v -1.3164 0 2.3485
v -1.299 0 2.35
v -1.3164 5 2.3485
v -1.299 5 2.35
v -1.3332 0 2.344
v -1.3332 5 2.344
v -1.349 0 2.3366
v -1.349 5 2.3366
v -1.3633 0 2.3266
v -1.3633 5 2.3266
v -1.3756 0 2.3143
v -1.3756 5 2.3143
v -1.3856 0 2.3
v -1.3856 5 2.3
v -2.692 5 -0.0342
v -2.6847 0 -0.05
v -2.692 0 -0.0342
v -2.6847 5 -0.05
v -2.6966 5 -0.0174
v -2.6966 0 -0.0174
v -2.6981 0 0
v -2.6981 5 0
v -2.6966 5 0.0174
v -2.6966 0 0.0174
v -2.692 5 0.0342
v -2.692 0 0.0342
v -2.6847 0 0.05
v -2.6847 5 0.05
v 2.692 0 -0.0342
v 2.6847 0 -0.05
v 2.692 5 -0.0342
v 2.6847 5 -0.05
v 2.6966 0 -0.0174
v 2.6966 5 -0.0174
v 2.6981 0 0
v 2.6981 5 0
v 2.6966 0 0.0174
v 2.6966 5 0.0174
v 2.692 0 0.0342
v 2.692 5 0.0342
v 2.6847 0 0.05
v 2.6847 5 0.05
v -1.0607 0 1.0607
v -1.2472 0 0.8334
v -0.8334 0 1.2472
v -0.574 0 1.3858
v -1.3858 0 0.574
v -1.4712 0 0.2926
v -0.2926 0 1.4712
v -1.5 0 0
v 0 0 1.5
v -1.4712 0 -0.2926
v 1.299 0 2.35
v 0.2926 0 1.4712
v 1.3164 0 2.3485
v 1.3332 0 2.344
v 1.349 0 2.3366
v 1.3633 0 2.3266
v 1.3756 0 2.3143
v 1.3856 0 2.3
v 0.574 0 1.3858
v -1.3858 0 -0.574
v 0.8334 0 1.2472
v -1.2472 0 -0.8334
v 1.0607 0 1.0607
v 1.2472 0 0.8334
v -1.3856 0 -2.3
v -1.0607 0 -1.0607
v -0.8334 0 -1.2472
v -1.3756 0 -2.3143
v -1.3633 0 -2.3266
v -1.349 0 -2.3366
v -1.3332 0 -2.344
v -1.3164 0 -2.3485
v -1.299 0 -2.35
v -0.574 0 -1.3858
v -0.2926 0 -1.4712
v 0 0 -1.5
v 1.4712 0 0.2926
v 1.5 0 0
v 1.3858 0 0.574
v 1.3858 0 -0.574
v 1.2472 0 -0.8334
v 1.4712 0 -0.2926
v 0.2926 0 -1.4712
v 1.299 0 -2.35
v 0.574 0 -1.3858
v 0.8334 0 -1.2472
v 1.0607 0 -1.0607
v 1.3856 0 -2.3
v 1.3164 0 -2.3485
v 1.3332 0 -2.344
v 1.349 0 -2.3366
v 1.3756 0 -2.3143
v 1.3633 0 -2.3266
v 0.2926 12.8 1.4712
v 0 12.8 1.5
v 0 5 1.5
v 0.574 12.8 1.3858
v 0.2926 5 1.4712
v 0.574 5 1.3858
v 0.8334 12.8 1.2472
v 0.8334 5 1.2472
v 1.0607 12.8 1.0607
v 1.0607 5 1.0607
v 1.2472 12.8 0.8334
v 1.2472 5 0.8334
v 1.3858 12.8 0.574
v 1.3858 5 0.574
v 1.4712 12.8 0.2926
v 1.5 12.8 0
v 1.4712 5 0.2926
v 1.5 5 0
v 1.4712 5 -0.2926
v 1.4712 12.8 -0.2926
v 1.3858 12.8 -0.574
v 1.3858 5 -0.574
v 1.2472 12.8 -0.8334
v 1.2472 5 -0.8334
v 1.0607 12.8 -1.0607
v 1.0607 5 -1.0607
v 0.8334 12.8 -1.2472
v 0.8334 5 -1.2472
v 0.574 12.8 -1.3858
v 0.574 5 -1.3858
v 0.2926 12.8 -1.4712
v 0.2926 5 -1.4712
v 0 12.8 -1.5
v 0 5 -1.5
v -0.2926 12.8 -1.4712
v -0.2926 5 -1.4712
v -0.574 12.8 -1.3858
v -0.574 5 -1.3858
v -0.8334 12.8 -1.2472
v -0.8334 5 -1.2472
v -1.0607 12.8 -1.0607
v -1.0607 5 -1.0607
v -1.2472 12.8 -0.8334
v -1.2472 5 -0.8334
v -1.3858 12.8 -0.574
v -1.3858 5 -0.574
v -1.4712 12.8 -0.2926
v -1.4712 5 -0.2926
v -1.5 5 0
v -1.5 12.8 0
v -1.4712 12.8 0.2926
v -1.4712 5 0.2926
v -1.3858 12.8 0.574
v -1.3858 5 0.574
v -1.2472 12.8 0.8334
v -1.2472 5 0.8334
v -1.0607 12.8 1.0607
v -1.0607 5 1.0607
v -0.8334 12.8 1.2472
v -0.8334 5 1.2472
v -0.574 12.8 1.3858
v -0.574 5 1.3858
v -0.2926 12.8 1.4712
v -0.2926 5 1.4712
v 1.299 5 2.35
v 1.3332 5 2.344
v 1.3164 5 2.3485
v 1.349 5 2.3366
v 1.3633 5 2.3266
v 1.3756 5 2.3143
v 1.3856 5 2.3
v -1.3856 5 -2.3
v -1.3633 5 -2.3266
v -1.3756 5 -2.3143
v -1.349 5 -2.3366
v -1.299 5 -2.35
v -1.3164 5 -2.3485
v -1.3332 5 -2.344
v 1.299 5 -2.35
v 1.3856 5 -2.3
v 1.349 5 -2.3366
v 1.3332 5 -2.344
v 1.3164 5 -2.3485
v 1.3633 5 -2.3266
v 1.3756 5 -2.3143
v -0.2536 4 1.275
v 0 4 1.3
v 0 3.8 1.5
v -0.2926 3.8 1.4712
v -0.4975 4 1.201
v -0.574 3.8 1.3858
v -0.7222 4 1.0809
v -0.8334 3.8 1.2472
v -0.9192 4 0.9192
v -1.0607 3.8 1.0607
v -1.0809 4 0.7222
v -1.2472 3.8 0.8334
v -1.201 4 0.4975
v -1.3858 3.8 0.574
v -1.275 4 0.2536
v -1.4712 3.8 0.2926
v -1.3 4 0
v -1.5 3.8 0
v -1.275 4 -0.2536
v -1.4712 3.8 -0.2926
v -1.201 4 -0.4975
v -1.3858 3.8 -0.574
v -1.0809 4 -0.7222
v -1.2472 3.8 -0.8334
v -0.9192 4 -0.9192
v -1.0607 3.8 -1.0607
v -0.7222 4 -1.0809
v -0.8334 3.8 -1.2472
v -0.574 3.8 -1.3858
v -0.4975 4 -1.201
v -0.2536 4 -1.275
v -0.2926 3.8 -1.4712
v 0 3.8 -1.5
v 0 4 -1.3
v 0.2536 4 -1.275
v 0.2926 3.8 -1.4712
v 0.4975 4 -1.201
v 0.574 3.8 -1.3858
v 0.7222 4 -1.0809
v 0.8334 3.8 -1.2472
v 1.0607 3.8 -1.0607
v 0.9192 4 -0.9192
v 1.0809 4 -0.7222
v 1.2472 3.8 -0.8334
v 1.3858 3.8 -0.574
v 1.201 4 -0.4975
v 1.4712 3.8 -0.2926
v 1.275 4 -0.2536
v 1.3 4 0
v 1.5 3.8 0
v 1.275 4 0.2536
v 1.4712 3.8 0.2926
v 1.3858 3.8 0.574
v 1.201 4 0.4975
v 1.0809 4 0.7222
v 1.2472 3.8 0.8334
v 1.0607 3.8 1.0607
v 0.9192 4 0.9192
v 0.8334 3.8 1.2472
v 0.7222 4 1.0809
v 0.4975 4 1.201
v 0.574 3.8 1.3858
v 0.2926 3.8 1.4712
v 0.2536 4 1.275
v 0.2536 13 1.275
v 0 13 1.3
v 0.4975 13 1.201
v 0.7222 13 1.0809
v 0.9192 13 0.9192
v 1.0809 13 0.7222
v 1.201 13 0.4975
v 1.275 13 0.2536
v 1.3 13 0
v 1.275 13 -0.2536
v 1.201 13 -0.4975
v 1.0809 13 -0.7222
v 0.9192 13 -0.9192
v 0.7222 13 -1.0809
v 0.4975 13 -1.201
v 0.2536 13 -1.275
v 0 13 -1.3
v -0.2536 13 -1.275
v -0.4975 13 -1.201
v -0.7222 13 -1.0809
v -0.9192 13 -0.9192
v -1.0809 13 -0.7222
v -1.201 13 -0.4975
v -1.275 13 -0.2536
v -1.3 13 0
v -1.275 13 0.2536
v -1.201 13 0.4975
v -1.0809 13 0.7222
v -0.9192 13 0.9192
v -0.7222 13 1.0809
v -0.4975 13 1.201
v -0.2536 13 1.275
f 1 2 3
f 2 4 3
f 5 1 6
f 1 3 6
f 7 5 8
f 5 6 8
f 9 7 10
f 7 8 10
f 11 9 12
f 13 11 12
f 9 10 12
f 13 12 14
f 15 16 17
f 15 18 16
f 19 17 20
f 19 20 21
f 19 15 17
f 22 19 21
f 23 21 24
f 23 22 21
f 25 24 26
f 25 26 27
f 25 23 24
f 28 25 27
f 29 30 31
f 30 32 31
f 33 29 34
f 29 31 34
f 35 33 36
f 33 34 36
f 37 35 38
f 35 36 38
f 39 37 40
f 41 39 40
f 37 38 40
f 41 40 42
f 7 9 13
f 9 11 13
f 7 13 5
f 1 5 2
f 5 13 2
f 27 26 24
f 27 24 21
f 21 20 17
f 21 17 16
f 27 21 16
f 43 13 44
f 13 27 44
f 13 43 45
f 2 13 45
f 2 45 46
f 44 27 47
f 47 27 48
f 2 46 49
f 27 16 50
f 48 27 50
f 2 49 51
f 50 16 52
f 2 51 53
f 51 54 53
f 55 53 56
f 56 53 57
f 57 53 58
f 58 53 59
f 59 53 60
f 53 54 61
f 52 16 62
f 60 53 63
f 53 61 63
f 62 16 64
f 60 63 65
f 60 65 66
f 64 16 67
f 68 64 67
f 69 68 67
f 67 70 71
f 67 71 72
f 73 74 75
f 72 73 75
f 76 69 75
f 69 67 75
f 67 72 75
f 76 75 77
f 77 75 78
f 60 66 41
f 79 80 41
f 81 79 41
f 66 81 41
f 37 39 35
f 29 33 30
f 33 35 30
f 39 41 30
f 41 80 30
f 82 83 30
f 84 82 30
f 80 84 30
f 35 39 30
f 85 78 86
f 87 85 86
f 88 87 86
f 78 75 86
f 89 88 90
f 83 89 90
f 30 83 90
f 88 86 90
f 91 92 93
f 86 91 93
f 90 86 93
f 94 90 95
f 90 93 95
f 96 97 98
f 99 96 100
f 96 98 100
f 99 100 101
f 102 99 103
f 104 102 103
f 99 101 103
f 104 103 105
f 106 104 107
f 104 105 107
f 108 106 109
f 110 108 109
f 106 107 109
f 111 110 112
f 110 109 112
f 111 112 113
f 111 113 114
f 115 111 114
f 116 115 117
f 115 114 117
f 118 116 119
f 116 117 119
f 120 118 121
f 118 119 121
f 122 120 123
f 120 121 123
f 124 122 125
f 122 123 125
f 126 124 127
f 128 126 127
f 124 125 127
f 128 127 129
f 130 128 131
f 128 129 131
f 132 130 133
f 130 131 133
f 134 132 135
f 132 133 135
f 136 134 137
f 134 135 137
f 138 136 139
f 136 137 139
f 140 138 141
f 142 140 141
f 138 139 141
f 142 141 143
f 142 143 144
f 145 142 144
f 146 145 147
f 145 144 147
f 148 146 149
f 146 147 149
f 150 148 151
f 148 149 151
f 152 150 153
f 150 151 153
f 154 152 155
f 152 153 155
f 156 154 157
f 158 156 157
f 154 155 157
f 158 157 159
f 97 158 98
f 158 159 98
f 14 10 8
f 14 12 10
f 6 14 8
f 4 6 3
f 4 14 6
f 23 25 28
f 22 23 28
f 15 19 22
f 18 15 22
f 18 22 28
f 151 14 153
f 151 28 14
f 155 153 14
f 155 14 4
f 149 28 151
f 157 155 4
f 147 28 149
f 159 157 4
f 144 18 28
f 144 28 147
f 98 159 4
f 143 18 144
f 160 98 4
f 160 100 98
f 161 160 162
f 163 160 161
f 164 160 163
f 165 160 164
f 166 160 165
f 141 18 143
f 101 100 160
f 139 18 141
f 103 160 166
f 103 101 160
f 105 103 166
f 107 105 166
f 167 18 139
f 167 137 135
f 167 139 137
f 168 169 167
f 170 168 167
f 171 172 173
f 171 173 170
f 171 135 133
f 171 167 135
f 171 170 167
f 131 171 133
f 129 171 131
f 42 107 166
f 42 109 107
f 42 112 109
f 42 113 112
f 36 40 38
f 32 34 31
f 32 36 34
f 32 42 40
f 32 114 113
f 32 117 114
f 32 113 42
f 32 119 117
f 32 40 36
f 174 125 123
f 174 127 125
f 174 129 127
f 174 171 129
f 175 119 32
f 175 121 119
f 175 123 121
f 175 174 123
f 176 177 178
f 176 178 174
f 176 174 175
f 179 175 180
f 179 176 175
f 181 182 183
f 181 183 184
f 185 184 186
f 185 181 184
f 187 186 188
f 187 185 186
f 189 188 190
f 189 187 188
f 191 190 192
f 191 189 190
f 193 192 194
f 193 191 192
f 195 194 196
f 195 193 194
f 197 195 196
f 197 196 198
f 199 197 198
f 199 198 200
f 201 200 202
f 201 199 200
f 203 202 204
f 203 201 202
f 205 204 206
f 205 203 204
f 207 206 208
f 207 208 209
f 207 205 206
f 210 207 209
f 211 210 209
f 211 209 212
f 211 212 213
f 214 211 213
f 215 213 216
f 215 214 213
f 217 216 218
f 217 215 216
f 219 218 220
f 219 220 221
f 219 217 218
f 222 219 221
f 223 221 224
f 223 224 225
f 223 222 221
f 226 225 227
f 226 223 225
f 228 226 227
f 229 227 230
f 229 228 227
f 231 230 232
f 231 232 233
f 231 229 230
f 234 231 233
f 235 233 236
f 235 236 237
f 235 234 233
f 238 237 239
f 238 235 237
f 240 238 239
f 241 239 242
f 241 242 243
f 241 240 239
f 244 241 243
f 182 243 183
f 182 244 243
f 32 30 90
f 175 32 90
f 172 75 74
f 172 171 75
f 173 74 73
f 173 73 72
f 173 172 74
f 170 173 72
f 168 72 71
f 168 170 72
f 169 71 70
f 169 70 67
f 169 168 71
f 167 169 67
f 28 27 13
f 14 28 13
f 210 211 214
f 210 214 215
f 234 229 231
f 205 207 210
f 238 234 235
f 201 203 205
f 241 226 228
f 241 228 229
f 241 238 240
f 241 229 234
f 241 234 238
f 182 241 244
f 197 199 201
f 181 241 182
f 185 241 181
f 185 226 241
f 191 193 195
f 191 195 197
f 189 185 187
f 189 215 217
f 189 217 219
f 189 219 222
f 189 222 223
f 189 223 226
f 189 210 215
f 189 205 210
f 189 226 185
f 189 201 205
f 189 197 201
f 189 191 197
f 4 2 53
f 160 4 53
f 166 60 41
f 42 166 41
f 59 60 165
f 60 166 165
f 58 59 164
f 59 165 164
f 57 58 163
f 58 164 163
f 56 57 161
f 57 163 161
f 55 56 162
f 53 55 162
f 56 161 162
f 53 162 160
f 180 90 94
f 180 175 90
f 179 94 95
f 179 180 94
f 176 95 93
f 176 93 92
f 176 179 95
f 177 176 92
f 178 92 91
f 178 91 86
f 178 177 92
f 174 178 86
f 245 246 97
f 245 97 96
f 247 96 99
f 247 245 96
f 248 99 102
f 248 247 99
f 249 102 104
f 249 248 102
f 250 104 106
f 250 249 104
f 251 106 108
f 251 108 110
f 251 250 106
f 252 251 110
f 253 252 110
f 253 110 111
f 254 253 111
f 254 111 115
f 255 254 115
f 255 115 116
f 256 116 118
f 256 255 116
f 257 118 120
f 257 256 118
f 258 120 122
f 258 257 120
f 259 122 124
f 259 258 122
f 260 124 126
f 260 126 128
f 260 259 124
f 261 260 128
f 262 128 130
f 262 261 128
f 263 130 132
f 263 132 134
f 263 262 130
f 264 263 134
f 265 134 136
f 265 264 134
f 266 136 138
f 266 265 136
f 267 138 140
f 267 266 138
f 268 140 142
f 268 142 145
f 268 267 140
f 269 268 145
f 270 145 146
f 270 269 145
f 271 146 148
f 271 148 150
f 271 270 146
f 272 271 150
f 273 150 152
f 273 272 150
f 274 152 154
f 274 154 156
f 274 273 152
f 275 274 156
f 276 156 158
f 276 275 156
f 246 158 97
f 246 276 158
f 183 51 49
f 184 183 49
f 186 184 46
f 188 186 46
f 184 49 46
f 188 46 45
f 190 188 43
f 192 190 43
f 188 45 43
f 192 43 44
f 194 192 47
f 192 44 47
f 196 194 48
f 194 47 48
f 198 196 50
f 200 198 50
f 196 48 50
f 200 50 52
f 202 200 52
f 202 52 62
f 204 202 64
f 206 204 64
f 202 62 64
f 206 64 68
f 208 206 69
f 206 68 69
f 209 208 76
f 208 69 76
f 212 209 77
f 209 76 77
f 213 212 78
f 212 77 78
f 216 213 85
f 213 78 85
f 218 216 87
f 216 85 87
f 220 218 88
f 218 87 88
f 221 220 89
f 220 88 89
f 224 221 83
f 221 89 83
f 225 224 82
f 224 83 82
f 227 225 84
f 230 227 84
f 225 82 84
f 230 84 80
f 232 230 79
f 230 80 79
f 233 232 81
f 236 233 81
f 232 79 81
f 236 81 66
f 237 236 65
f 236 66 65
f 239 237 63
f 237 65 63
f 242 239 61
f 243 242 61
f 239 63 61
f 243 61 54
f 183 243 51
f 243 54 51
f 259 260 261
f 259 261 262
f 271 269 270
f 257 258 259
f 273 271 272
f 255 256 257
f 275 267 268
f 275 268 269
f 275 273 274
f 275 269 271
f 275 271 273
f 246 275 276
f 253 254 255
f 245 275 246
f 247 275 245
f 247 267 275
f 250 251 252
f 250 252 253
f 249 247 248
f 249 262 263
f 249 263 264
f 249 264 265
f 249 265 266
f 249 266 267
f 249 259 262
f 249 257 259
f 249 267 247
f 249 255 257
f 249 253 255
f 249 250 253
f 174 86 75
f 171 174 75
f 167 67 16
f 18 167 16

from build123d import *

# Parameters (mm, degrees)
EXTRUDE_1_DEPTH     = 5
SKETCH_2_R          = 1.5
EXTRUDE_2_DEPTH     = 8
SKETCH_3_R          = 1.5
CUT_EXTRUDE_1_DEPTH = 4
CHAMFER_1_SIZE      = 0.2
FILLET_1_R          = 0.1


with BuildPart() as part:
    # 草图1 → 凸台-拉伸1 (new body)
    with BuildSketch(Plane(origin=(0, 0, 0), x_dir=(1, 0, 0), z_dir=(0, 1, 0))):
        Polygon((2.713546265, 0), (1.356773133, 2.35), (-1.356773133, 2.35), (-2.713546265, 0), (-1.356773133, -2.35), (1.356773133, -2.35), align=None)
    extrude(amount=EXTRUDE_1_DEPTH)

    # 草图2 → 凸台-拉伸2 (add)
    with BuildSketch(Plane(origin=(0, 5, 0), x_dir=(1, 0, 0), z_dir=(0, 1, 0))):
        with Locations(Location((0, 0, 0), (0, 0, 270))):
            Circle(SKETCH_2_R)
    extrude(amount=EXTRUDE_2_DEPTH)

    # 草图3 → 切除-拉伸1 (cut)
    with BuildSketch(Plane.XZ):
        with Locations(Location((0, 0, 0), (0, 0, 90))):
            Circle(SKETCH_3_R)
    extrude(amount=-CUT_EXTRUDE_1_DEPTH, mode=Mode.SUBTRACT)

    # 倒角1
    chamfer_1_edges = [part.edges().sort_by_distance(p)[0] for p in [
        (0, 13, -1.5),
        (0, 4, -1.5),
    ]]
    chamfer(chamfer_1_edges, length=CHAMFER_1_SIZE)

    # 圆角1
    fillet_1_edges = [part.edges().sort_by_distance(p)[0] for p in [
        (1.356773133, 2.5, 2.35),
        (-1.356773133, 2.5, 2.35),
        (-2.713546265, 2.5, 0),
        (-1.356773133, 2.5, -2.35),
        (1.356773133, 2.5, -2.35),
        (2.713546265, 2.5, 0),
    ]]
    fillet(fillet_1_edges, radius=FILLET_1_R)


solid = part.part
